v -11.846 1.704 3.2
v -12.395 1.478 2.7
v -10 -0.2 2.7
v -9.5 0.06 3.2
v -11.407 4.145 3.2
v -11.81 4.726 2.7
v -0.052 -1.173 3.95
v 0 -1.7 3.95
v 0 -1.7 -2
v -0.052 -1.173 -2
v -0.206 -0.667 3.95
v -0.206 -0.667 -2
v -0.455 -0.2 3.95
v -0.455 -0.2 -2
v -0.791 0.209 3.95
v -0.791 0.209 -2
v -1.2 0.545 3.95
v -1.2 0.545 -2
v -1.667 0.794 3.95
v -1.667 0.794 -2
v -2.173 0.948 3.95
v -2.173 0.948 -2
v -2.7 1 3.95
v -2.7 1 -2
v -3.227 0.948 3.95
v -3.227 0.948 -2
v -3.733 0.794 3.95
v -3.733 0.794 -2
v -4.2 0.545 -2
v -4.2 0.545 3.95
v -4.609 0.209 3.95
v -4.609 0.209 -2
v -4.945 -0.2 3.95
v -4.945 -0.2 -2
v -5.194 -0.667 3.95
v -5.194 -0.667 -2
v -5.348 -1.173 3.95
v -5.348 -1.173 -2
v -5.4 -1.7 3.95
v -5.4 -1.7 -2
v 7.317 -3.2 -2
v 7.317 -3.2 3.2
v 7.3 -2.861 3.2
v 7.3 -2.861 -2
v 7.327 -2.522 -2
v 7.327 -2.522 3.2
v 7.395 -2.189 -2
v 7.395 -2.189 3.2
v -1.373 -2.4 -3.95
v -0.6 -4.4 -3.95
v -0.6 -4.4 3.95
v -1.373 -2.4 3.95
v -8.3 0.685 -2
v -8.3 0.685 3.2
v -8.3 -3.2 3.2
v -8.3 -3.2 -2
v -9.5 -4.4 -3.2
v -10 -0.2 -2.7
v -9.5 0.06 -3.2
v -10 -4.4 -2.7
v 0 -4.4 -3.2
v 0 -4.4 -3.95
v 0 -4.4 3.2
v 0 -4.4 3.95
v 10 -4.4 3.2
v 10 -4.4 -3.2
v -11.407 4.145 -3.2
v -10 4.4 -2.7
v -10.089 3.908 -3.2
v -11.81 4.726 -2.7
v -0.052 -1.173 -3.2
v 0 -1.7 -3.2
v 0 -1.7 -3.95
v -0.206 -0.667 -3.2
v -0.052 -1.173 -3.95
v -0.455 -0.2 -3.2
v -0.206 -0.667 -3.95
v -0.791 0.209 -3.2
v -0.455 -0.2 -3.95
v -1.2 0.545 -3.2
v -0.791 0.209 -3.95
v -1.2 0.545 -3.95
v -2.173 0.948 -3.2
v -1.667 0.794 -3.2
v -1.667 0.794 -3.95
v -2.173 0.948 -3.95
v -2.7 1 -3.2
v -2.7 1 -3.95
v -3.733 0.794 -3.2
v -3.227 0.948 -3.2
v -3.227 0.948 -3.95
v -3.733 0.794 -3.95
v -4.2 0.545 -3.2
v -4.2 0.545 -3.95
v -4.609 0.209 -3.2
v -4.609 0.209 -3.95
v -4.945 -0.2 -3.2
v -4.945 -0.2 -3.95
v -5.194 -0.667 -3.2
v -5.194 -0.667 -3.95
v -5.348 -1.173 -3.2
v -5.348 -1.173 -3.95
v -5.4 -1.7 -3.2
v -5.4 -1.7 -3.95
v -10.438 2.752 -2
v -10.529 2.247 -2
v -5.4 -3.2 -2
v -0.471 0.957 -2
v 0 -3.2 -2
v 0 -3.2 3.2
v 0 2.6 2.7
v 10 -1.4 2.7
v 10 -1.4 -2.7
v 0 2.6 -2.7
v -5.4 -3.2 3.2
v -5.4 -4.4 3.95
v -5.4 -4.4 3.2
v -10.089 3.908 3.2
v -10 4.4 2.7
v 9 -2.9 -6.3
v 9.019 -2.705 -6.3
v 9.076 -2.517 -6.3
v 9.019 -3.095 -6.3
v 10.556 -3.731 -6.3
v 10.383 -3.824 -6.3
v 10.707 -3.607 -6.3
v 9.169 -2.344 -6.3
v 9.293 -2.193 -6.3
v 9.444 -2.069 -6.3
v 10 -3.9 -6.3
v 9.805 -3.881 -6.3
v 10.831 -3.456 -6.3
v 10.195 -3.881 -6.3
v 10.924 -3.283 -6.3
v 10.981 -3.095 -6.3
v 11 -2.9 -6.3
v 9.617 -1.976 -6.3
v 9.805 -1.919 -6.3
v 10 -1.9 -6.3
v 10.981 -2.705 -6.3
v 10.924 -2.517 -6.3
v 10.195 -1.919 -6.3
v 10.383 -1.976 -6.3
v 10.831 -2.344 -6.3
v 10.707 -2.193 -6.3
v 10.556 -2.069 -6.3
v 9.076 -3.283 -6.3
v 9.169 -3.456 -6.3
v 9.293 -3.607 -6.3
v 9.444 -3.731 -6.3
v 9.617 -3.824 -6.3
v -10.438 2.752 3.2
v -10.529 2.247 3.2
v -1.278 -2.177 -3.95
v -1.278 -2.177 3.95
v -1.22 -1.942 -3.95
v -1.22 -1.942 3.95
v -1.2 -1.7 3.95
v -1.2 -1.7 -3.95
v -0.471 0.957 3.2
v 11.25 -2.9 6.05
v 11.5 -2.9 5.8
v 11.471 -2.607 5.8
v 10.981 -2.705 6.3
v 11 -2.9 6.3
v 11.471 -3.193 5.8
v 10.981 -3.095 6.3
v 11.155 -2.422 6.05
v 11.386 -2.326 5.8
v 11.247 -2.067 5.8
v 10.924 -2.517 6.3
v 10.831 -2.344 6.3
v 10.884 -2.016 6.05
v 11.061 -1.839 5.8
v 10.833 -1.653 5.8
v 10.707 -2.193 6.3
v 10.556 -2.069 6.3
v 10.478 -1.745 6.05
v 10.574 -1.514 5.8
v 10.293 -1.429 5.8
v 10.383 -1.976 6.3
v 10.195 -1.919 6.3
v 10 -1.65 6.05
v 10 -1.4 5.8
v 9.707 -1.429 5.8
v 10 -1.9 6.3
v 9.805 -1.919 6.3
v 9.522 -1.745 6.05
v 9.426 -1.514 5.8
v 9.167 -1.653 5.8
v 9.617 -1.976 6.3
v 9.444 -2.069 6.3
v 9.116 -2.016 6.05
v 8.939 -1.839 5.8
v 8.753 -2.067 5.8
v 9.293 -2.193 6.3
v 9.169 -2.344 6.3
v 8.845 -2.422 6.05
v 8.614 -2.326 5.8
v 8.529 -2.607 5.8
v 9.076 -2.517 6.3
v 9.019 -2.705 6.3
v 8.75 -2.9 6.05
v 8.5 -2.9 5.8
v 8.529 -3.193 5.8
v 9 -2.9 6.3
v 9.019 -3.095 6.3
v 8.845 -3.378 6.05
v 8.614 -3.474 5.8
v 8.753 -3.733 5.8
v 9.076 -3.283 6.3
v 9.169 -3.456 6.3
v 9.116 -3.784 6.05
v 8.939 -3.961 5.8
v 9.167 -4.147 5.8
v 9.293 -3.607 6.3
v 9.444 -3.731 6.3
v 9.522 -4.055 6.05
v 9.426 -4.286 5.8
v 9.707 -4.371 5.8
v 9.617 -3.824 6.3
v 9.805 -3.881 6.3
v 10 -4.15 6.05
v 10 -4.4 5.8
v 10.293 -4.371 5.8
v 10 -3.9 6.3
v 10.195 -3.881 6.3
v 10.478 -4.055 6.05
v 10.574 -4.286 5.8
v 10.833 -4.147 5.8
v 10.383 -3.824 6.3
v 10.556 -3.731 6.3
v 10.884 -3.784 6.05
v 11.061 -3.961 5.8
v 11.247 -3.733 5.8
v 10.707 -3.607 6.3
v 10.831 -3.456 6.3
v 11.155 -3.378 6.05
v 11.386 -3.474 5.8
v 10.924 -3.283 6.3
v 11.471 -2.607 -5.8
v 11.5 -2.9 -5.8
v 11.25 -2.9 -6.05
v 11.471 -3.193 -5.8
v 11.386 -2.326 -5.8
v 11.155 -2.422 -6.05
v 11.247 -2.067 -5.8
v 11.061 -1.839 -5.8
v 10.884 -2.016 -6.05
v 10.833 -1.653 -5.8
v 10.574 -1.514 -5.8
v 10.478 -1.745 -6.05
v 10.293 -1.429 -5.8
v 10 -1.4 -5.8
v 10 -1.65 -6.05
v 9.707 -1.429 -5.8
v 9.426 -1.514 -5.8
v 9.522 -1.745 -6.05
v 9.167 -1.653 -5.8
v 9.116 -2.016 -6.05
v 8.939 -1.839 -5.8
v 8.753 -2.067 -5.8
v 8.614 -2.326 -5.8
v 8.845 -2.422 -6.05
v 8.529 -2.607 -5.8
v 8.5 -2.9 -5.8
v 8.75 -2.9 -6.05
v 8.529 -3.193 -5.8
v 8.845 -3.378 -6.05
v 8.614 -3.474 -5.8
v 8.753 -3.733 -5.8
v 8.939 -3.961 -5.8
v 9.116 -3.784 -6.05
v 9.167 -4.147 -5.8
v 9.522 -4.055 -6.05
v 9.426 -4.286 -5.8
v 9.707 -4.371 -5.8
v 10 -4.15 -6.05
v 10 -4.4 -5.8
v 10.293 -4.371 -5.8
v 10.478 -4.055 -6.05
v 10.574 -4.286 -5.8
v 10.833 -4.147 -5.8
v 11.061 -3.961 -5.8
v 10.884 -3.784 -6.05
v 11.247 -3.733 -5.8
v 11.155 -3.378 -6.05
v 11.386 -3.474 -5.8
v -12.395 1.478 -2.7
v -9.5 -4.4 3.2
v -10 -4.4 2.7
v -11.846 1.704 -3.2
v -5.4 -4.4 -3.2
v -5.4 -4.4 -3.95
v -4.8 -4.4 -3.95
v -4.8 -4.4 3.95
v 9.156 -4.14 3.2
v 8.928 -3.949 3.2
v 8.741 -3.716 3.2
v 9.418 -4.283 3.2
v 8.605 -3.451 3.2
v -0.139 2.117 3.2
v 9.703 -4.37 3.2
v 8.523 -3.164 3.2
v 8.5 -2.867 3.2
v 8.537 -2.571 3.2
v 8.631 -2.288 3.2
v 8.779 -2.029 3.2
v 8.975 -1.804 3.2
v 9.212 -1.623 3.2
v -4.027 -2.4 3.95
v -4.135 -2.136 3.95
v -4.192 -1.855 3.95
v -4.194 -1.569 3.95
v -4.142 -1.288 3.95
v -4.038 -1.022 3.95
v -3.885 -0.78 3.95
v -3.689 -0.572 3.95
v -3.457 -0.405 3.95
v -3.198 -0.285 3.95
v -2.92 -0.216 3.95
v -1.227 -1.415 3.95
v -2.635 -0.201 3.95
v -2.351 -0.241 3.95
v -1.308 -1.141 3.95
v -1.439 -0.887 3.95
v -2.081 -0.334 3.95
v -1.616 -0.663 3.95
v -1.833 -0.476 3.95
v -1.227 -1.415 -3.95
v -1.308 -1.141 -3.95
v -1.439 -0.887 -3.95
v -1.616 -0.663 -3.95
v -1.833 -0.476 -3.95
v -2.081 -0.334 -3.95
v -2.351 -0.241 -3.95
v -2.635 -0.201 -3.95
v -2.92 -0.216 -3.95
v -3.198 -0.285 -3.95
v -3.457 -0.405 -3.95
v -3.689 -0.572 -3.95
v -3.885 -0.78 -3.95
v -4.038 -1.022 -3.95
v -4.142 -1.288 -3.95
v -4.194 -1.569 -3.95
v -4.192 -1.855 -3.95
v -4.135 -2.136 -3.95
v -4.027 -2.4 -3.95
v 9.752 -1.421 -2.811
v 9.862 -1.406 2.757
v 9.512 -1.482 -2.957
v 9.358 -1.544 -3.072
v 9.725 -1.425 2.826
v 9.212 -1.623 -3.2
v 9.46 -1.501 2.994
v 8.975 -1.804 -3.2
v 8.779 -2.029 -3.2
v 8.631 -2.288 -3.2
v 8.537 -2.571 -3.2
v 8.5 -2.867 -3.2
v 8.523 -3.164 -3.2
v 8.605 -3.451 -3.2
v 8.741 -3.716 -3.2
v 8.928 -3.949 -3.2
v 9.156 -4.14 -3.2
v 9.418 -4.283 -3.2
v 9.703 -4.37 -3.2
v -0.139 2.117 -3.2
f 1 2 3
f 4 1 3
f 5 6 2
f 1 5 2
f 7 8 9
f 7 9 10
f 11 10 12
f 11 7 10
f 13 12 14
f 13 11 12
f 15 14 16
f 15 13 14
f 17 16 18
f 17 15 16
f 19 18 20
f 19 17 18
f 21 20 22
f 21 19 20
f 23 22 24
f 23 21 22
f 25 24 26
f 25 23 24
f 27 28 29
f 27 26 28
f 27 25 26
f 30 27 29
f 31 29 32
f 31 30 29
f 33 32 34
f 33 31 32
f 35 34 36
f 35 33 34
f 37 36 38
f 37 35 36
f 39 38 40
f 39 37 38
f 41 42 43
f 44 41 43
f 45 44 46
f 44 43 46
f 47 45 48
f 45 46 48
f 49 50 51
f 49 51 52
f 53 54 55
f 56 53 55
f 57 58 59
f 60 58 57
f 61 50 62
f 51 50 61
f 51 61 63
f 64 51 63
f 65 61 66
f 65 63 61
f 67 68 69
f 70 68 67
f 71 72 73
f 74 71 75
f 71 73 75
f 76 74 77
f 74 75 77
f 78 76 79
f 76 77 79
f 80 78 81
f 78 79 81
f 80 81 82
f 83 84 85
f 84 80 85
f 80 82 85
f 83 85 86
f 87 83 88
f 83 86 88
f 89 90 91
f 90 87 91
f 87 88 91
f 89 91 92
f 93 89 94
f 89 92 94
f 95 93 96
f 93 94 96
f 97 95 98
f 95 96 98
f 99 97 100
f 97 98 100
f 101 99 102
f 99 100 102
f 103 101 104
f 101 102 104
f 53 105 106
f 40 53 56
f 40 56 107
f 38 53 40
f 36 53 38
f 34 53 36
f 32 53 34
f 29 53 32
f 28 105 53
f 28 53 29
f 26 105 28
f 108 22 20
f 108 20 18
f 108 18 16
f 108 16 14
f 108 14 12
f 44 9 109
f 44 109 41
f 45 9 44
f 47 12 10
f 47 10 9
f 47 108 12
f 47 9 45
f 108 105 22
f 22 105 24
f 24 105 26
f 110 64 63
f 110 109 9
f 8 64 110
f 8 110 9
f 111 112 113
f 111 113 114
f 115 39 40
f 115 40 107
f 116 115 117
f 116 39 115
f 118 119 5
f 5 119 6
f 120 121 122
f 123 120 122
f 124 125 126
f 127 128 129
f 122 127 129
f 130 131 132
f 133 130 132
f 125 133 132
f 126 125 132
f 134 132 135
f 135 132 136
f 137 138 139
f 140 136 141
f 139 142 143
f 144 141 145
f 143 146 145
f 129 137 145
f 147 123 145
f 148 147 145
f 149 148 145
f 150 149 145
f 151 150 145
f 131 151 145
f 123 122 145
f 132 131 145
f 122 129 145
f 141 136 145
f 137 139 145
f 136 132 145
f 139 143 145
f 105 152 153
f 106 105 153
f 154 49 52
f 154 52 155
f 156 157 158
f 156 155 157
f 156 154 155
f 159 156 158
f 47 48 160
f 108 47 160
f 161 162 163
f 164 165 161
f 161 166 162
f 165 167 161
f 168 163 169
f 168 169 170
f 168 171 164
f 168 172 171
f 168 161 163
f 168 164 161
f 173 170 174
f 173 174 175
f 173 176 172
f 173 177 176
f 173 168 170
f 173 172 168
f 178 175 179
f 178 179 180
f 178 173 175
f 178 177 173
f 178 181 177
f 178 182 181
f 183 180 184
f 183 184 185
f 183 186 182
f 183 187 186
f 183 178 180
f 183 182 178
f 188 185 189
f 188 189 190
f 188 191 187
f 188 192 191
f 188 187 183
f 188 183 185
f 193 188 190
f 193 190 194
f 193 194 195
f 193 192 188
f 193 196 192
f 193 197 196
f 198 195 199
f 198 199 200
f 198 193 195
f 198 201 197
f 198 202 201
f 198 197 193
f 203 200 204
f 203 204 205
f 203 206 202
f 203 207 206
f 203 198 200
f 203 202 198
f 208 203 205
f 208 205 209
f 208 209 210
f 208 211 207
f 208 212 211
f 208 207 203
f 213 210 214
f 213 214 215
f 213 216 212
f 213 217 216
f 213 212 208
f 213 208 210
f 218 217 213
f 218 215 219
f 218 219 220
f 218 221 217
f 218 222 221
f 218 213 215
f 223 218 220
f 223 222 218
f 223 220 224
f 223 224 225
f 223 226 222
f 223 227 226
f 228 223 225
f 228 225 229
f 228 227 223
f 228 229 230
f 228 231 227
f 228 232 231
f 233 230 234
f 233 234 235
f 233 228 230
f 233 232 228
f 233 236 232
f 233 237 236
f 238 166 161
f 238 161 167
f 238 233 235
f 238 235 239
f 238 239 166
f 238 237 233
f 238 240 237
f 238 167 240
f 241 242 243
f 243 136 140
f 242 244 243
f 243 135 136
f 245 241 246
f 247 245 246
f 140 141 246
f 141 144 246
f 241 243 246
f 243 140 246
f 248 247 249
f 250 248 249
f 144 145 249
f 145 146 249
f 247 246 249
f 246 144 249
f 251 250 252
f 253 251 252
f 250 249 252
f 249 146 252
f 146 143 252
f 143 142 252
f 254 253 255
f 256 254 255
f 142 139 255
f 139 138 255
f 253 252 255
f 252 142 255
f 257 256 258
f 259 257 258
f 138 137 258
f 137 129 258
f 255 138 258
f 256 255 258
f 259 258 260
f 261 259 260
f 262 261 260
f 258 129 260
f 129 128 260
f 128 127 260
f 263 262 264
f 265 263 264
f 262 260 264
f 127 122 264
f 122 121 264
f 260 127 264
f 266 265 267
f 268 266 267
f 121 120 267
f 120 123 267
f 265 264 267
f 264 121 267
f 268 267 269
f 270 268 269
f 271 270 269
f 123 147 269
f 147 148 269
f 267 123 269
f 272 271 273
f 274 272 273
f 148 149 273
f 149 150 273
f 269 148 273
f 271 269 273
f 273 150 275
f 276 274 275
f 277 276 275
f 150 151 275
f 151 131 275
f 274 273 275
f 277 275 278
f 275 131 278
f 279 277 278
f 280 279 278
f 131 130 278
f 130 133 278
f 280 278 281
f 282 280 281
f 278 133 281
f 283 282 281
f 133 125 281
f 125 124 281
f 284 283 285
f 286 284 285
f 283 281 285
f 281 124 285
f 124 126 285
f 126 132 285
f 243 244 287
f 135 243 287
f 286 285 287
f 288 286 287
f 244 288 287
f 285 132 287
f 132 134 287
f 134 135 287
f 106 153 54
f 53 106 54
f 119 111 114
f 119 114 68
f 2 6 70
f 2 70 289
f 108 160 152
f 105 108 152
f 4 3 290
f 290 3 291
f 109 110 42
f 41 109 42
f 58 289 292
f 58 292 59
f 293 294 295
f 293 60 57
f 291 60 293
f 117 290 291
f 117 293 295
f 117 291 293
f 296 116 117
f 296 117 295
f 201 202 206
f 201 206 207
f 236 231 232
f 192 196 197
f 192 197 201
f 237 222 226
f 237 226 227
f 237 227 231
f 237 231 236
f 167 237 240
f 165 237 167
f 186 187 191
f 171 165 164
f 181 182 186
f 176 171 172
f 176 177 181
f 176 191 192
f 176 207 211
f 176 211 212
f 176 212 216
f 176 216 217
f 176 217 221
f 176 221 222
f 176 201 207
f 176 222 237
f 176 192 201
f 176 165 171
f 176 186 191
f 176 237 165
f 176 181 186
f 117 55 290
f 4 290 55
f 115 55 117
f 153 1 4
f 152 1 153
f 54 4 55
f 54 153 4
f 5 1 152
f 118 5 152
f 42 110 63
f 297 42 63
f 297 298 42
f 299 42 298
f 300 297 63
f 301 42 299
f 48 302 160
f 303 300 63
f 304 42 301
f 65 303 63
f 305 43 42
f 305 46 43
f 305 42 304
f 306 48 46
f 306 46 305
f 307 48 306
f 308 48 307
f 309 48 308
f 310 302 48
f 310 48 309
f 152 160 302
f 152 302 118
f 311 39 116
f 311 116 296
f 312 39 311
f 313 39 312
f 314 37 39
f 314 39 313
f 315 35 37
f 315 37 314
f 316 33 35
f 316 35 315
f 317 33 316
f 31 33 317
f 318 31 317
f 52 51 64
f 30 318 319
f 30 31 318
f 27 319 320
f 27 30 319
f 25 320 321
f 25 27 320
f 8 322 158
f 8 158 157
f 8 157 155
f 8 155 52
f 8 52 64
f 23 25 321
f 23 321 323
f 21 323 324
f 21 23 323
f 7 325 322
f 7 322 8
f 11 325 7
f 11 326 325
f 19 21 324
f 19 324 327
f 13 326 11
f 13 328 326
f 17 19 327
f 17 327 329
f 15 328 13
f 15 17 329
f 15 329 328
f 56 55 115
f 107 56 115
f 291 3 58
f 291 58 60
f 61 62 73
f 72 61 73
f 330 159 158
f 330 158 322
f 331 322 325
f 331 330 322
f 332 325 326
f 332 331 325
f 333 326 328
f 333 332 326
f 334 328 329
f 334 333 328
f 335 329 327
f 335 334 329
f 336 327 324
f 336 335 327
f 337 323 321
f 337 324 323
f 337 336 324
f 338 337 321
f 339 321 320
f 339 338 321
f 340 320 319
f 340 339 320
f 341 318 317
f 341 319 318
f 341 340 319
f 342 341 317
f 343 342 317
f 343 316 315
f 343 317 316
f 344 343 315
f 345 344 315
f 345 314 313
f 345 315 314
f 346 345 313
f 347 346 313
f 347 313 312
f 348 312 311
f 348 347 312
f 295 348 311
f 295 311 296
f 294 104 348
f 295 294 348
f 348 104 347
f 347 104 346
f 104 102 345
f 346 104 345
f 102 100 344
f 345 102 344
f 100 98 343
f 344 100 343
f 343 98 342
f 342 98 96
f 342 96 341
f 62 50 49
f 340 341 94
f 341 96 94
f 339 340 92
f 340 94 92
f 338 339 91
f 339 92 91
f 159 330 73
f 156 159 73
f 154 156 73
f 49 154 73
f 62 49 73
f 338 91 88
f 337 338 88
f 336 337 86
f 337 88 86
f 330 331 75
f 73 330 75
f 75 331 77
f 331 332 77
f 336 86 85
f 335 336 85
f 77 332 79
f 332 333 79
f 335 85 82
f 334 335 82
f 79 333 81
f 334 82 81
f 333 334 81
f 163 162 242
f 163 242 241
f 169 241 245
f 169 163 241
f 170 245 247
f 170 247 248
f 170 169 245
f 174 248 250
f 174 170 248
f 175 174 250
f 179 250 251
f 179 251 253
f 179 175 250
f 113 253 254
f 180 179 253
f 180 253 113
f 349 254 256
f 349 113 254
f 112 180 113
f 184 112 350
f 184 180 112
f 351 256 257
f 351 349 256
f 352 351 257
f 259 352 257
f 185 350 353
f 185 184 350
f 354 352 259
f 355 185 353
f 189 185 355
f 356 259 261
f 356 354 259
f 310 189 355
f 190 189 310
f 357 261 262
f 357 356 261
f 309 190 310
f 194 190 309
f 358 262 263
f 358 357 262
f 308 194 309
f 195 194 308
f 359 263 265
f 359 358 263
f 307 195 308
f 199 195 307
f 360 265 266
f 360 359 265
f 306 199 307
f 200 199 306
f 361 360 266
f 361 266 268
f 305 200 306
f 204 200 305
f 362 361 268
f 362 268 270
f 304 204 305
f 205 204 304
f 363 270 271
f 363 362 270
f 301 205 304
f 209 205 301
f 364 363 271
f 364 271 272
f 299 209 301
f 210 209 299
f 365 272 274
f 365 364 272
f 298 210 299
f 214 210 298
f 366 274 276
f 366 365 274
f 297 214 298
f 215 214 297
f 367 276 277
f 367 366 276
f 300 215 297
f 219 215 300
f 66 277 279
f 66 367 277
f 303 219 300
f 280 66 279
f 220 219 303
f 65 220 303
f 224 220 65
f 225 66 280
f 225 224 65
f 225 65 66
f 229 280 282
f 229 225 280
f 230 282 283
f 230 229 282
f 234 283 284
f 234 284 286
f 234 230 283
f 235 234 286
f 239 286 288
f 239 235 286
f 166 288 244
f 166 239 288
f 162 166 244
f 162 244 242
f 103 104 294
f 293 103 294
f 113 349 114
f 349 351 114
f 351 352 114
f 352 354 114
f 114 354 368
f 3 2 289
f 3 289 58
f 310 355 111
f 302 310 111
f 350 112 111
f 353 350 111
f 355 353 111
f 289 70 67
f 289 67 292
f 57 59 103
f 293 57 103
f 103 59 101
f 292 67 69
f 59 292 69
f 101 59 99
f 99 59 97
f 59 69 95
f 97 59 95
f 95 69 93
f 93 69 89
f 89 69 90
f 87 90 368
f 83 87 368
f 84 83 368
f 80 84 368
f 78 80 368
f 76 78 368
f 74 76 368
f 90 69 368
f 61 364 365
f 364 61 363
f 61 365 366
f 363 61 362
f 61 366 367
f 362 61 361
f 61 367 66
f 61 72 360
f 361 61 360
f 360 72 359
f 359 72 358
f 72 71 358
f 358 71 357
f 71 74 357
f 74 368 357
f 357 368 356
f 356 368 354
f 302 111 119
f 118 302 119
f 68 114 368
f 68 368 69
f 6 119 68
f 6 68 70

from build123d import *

# Parameters (mm, degrees)
BOSS_EXTRUDE1_DEPTH     = 3.2
BOSS_EXTRUDE2_DEPTH     = 0.75
CUT_EXTRUDE1_DEPTH      = 16.439388307
CUT_EXTRUDE1_DEPTH_BACK = 16.439388307
SKETCH4_R               = 1.5
BOSS_EXTRUDE3_DEPTH     = 6.3
CHAMFER1_SIZE           = 0.5
CHAMFER2_SIZE           = 0.5
CUT_EXTRUDE2_DEPTH      = 5.2


with BuildPart() as part:
    # Sketch1 → Boss-Extrude1 (new, symmetric)
    with BuildSketch(Plane.XY):
        Polygon((-10, -4.4), (10, -4.4), (10, -1.4), (0, 2.6), (-10, 4.4), (-10, -0.2), align=None)
        Polygon((-12.394804782, 1.478031011), (-10, -0.2), (-10, 4.4), (-11.810199888, 4.72583598), align=None)
    extrude(amount=BOSS_EXTRUDE1_DEPTH, both=True)

    # Sketch2 → Boss-Extrude2 (add, symmetric)
    with BuildSketch(Plane.XY.offset(3.2)):
        with BuildLine():
            ThreePointArc((0, -1.7), (-2.7, 1), (-5.4, -1.7))
            Line((-5.4, -1.7), (-2.7, -4.4))
            Line((-2.7, -4.4), (0, -1.7))
        make_face()
        with BuildLine():
            Line((-2.7, -4.4), (-5.4, -1.7))
            ThreePointArc((-5.4, -1.7), (-4.609188309, -3.609188309), (-2.7, -4.4))
        make_face()
        with BuildLine():
            Line((0, -1.7), (-2.7, -4.4))
            ThreePointArc((-2.7, -4.4), (-0.790811691, -3.609188309), (0, -1.7))
        make_face()
        with BuildLine():
            ThreePointArc((0, -1.7), (-0.790811691, -3.609188309), (-2.7, -4.4))
            Line((-2.7, -4.4), (0, -4.4))
            Line((0, -4.4), (0, -1.7))
        make_face()
        with BuildLine():
            ThreePointArc((-2.7, -4.4), (-4.609188309, -3.609188309), (-5.4, -1.7))
            Line((-5.4, -1.7), (-5.4, -4.4))
            Line((-5.4, -4.4), (-2.7, -4.4))
        make_face()
    boss_extrude2 = extrude(amount=BOSS_EXTRUDE2_DEPTH, both=True)

    # Mirror1: Boss-Extrude2 across plane
    add(boss_extrude2.mirror(Plane.XY))

    # Sketch3 → Cut-Extrude1 (cut, two sides: drawn at the far end of the back side and taken through both)
    with BuildSketch(Plane.XY.offset(3.95).offset(-CUT_EXTRUDE1_DEPTH_BACK)):
        with BuildLine():
            ThreePointArc((-1.2, -1.7), (-3.060572549, -0.243982336), (-4.026649916, -2.4))
            Line((-4.026649916, -2.4), (-1.373350084, -2.4))
            ThreePointArc((-1.373350084, -2.4), (-1.243982336, -2.060572549), (-1.2, -1.7))
        make_face()
        with BuildLine():
            Line((-1.373350084, -2.4), (-4.026649916, -2.4))
            ThreePointArc((-4.026649916, -2.4), (-2.7, -3.2), (-1.373350084, -2.4))
        make_face()
        with BuildLine():
            Line((-4.026649916, -2.4), (-4.8, -4.4))
            Line((-4.8, -4.4), (-0.6, -4.4))
            Line((-0.6, -4.4), (-1.373350084, -2.4))
            ThreePointArc((-1.373350084, -2.4), (-2.7, -3.2), (-4.026649916, -2.4))
        make_face()
    extrude(amount=CUT_EXTRUDE1_DEPTH + CUT_EXTRUDE1_DEPTH_BACK, mode=Mode.SUBTRACT)

    # Sketch4 → Boss-Extrude3 (add, symmetric)
    with BuildSketch(Plane.XY):
        with Locations((10, -2.9)):
            Circle(SKETCH4_R)
    extrude(amount=BOSS_EXTRUDE3_DEPTH, both=True)

    # Chamfer1
    chamfer1_edges = [part.edges().sort_by_distance(p)[0] for p in [
        (8.5, -2.9, -6.3),
        (8.5, -2.9, 6.3),
    ]]
    chamfer(chamfer1_edges, length=CHAMFER1_SIZE)

    # Chamfer2
    chamfer2_edges = [part.edges().sort_by_distance(p)[0] for p in [
        (-5.905099944, 3.66291799, 3.2),
        (-11.197402391, 0.639015505, -3.2),
        (-12.102502335, 3.101933495, -3.2),
        (-5.905099944, 3.66291799, -3.2),
        (5, 0.6, -3.2),
        (-12.102502335, 3.101933495, 3.2),
        (-11.197402391, 0.639015505, 3.2),
        (-10, -2.3, 3.2),
        (5, 0.6, 3.2),
        (-10, -2.3, -3.2),
    ]]
    chamfer(chamfer2_edges, length=CHAMFER2_SIZE)

    # Sketch5 → Cut-Extrude2 (cut)
    with BuildSketch(Plane.XY.offset(3.2)):
        with BuildLine():
            Line((-10.438248334, 2.751564232), (-10.529148071, 2.246565691))
            Line((-10.529148071, 2.246565691), (-8.3, 0.684609736))
            Line((-8.3, 0.684609736), (-8.3, -3.2))
            Line((-8.3, -3.2), (-5.4, -3.2))
            Line((-5.4, -3.2), (-5.4, -1.7))
            ThreePointArc((-5.4, -1.7), (-2.7, 1), (0, -1.7))
            Line((0, -1.7), (0, -3.2))
            Line((0, -3.2), (7.316718427, -3.2))
            ThreePointArc((7.316718427, -3.2), (7.308115775, -2.690812714), (7.395278362, -2.189067379))
            Line((7.395278362, -2.189067379), (-0.471070755, 0.957472268))
            Line((-0.471070755, 0.957472268), (-10.438248334, 2.751564232))
        make_face()
    extrude(amount=-CUT_EXTRUDE2_DEPTH, mode=Mode.SUBTRACT)


solid = part.part
